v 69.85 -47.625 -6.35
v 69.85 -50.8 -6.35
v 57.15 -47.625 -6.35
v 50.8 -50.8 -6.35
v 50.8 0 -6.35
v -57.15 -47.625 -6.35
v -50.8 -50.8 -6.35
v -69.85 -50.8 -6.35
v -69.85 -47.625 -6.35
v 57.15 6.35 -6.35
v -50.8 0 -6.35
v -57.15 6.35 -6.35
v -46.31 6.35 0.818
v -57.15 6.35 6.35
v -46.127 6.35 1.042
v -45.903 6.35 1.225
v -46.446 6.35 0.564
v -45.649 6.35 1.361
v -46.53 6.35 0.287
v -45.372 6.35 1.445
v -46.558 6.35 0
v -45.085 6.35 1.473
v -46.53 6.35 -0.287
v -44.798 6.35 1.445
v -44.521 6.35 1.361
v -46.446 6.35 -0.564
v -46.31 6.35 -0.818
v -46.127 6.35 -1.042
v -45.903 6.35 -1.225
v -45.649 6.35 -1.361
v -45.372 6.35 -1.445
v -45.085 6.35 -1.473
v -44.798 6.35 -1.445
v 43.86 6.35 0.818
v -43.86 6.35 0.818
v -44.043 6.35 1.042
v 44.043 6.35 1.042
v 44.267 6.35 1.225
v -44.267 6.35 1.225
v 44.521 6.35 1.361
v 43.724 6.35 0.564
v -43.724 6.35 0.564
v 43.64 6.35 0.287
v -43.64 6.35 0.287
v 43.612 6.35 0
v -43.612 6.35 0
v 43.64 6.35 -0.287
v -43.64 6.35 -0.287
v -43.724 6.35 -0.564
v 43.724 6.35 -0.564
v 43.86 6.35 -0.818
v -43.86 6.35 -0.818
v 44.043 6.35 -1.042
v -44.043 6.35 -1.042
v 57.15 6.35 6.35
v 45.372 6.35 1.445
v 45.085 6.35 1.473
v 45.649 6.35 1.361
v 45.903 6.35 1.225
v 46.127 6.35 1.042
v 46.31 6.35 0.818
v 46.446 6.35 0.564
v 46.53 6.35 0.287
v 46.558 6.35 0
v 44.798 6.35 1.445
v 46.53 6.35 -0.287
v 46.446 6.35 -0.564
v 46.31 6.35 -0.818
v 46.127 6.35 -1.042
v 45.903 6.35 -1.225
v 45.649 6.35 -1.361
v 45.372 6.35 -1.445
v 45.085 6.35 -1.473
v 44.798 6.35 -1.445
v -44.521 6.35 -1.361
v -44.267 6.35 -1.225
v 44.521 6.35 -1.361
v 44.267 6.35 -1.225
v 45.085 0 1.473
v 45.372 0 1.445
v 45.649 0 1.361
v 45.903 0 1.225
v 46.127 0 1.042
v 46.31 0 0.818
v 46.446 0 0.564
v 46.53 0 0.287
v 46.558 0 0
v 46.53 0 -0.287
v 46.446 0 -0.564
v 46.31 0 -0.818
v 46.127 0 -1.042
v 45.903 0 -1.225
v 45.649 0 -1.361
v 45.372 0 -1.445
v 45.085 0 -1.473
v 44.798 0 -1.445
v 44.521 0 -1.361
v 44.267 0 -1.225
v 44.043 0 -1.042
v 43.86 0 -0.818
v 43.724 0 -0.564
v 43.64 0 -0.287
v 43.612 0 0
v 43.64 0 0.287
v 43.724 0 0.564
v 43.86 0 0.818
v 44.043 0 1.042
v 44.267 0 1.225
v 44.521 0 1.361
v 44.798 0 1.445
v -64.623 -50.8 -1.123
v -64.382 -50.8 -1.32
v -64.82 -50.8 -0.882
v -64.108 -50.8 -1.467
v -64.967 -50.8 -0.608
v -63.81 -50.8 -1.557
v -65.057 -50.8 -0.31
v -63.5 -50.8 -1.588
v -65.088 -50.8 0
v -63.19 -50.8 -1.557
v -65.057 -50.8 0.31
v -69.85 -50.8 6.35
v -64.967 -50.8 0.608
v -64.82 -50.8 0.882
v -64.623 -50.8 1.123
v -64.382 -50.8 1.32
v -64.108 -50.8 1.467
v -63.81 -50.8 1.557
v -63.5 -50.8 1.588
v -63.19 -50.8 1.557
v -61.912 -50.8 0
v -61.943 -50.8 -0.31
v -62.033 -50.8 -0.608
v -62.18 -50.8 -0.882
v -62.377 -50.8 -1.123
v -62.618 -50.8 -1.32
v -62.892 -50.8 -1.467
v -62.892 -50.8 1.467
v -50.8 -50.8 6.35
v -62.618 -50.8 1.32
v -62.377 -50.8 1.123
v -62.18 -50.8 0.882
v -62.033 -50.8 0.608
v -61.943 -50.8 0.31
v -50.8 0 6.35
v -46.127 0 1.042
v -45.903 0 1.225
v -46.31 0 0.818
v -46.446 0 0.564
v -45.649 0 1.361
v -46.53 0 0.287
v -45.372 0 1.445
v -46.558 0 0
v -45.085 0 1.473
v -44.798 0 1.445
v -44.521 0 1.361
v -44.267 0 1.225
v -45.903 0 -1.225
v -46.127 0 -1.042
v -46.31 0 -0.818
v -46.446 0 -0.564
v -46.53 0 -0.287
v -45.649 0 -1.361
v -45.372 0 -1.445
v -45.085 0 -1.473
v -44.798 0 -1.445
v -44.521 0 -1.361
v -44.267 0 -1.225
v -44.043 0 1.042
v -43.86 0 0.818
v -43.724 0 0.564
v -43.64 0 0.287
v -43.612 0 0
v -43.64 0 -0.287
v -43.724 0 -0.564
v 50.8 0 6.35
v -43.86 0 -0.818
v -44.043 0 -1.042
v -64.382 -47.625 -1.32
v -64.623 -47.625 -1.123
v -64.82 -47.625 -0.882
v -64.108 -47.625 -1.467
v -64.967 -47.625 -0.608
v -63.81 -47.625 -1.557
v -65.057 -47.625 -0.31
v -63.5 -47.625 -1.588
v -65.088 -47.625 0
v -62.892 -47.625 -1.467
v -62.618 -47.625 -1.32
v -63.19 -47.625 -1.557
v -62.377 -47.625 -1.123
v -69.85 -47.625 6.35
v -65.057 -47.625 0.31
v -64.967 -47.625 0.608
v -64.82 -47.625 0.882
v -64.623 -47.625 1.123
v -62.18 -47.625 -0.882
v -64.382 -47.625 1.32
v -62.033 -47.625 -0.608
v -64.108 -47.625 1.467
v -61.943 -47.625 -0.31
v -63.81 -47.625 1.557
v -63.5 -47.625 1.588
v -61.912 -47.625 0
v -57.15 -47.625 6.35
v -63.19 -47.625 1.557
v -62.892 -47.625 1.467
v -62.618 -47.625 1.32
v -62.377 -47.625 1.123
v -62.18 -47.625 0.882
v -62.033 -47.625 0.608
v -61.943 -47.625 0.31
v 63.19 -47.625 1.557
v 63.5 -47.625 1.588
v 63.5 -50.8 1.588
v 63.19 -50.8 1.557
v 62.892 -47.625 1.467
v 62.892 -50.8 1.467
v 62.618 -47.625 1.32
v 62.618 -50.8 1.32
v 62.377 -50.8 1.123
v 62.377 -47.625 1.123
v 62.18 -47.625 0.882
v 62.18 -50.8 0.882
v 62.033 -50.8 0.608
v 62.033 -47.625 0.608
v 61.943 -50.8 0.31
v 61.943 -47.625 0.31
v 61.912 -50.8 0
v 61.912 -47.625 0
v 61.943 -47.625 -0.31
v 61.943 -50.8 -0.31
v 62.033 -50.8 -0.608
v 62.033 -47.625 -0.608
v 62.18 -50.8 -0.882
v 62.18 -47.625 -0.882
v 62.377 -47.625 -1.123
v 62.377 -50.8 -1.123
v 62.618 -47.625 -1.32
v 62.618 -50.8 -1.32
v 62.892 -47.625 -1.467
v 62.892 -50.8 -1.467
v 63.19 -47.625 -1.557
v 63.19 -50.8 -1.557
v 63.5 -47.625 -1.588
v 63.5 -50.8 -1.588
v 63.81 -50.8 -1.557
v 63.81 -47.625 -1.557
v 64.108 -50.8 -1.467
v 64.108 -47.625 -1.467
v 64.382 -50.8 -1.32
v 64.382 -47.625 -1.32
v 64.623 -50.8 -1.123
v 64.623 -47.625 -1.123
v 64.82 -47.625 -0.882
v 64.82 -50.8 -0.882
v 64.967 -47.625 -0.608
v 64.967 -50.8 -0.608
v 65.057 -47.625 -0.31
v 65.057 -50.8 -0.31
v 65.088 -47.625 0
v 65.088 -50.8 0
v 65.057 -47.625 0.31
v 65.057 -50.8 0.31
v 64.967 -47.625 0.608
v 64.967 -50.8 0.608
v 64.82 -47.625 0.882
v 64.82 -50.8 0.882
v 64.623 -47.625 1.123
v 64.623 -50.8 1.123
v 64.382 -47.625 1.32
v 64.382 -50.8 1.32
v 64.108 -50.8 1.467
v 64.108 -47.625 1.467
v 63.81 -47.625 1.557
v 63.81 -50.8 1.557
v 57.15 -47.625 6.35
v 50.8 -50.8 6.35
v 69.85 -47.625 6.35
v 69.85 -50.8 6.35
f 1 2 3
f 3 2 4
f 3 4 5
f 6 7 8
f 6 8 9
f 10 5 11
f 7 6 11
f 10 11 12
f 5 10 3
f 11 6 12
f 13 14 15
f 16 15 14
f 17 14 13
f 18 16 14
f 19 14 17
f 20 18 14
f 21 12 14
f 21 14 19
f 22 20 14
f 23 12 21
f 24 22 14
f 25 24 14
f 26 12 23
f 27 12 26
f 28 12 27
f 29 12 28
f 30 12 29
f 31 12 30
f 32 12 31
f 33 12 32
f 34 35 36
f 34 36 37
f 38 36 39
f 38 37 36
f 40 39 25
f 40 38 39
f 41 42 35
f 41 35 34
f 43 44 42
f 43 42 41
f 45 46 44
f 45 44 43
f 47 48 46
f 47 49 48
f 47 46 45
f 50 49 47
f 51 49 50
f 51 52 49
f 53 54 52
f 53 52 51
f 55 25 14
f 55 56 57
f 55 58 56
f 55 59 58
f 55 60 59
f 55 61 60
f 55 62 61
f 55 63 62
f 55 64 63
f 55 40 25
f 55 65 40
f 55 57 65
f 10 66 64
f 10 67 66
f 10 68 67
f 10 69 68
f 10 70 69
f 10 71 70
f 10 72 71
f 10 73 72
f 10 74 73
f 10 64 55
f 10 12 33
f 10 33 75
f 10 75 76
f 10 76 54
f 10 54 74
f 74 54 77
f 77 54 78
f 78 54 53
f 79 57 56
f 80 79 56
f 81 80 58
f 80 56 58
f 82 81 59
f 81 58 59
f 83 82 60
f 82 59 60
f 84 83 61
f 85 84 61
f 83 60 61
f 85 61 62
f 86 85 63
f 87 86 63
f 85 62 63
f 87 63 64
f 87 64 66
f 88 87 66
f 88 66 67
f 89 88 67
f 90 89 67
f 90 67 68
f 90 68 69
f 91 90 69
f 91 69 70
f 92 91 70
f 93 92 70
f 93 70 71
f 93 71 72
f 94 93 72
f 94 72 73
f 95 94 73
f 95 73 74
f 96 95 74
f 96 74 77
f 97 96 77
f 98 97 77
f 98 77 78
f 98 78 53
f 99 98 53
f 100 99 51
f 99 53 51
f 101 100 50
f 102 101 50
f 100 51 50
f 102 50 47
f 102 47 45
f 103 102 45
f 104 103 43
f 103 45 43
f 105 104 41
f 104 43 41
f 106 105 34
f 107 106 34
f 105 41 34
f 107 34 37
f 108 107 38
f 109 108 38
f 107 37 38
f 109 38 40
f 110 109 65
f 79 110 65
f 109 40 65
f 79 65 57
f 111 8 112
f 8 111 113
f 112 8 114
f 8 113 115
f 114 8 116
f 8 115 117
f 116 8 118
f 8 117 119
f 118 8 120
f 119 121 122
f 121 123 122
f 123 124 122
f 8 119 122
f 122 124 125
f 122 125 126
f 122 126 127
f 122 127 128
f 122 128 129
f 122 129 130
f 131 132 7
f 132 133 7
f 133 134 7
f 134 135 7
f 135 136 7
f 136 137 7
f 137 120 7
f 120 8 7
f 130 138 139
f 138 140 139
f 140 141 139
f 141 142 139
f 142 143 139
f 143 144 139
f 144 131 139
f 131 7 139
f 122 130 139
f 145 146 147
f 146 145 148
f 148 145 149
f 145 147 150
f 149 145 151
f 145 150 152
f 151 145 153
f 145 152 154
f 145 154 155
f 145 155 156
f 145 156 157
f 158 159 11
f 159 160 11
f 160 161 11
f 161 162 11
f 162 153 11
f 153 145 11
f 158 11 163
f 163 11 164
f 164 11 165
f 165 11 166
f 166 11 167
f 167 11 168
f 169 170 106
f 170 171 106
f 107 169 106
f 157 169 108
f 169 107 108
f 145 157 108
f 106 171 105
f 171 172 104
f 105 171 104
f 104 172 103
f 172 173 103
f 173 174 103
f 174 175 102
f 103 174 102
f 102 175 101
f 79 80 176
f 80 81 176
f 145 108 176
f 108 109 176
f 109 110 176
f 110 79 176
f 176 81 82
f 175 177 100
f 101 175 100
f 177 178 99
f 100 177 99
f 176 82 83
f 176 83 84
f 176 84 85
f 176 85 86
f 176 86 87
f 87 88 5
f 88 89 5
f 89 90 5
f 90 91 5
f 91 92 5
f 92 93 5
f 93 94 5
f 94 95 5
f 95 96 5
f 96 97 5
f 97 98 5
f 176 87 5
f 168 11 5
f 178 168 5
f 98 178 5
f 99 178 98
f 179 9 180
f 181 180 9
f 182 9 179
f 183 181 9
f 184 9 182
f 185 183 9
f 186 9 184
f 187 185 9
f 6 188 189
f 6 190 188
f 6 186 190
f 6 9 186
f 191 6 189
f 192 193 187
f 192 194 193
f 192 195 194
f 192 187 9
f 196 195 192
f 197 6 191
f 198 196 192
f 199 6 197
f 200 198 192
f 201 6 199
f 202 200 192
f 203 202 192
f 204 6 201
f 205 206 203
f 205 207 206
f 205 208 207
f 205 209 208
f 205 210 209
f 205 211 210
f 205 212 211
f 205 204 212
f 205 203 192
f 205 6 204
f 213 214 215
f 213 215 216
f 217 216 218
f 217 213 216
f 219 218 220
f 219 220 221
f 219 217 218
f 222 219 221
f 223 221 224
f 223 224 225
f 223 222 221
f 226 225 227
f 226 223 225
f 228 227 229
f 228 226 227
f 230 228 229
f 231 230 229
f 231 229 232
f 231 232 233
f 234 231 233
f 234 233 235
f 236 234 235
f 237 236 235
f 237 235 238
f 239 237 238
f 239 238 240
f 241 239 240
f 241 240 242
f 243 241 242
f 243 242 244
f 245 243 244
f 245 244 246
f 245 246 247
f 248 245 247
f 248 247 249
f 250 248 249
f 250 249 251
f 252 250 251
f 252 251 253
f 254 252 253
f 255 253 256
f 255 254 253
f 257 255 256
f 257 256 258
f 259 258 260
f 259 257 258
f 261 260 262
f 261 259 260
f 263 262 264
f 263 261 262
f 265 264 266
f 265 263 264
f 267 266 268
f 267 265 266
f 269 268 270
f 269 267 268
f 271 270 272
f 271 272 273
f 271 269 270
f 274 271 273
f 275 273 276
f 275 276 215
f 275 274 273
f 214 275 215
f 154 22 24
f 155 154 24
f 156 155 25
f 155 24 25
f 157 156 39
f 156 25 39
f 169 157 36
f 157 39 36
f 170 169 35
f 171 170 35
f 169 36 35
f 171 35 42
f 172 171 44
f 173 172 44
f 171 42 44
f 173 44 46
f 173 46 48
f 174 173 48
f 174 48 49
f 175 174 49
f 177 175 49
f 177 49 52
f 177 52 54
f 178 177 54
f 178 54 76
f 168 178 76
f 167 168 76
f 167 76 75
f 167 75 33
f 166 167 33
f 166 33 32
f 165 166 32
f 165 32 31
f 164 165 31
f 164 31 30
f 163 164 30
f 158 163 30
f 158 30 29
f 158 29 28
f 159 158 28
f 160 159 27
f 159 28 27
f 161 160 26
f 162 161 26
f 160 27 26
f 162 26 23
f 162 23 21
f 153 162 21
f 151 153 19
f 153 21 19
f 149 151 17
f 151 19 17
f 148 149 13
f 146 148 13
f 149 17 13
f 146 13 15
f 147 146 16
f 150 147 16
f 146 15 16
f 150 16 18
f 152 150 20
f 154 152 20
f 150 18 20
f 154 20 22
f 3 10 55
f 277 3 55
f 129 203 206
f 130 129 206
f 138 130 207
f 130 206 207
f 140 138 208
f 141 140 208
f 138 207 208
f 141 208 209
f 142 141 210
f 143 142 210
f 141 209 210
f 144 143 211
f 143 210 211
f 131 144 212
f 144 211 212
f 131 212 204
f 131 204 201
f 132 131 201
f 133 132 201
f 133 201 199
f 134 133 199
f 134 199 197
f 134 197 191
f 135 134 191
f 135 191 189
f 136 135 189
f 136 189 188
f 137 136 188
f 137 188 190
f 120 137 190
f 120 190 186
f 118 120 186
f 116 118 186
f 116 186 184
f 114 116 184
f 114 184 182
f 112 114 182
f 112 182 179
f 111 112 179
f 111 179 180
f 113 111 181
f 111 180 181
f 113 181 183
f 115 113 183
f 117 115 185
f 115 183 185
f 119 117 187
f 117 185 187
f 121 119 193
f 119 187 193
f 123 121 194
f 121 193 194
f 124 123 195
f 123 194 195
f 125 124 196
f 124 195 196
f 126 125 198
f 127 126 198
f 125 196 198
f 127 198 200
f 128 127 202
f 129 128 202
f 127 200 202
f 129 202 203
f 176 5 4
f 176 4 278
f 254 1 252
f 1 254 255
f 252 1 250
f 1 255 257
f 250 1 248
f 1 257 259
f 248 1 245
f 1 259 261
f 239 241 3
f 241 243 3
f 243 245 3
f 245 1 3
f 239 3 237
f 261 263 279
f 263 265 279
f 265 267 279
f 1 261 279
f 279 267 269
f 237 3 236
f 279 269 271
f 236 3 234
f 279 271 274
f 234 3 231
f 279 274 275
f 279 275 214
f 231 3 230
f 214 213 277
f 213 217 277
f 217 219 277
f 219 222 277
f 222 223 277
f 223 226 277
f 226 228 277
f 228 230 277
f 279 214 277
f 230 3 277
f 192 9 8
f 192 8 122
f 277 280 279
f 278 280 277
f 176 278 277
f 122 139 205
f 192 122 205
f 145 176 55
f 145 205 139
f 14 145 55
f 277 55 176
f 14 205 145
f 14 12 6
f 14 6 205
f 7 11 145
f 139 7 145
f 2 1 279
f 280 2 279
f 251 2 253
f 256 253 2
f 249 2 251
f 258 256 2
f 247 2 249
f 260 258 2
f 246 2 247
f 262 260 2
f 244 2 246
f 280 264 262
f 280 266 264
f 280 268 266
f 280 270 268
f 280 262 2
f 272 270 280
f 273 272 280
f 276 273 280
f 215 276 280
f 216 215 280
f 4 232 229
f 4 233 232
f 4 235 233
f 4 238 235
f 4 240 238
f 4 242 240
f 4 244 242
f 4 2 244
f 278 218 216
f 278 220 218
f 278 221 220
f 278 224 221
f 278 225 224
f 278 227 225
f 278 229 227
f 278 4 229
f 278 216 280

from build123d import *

# Parameters (mm, degrees)
SKETCH1_W           = 114.3
SKETCH1_H           = 12.7
BOSS_EXTRUDE1_DEPTH = 6.35
SKETCH2_W           = 6.35
SKETCH2_H           = 12.7
BOSS_EXTRUDE2_DEPTH = 50.8
SKETCH3_W           = 12.7
SKETCH3_H           = 3.175
BOSS_EXTRUDE3_DEPTH = 12.7
CUT_EXTRUDE1_REACH  = 90.502
SKETCH4_R           = 1.5875
CUT_EXTRUDE2_REACH  = 92.474
SKETCH5_R           = 1.4732


with BuildPart() as part:
    # Sketch1 → Boss-Extrude1 (new body)
    with BuildSketch(Plane(origin=(0, 0, 0), x_dir=(1, 0, 0), z_dir=(0, 1, 0))):
        Rectangle(SKETCH1_W, SKETCH1_H)
    extrude(amount=BOSS_EXTRUDE1_DEPTH)

    # Sketch2 → Boss-Extrude2 (add)
    with BuildSketch(Plane.XZ):
        with Locations((-53.975, 0)):
            Rectangle(SKETCH2_W, SKETCH2_H)
    boss_extrude2 = extrude(amount=BOSS_EXTRUDE2_DEPTH)

    # Sketch3 → Boss-Extrude3 (add)
    with BuildSketch(Plane.ZY.offset(57.15)):
        with Locations((0, -49.2125)):
            Rectangle(SKETCH3_W, SKETCH3_H)
    boss_extrude3 = extrude(amount=BOSS_EXTRUDE3_DEPTH)

    # Mirror1: Boss-Extrude2, Boss-Extrude3 across plane
    add(boss_extrude2.mirror(Plane(origin=(0, 0, 0), x_dir=(0, 0, 1), z_dir=(1, 0, 0))))
    add(boss_extrude3.mirror(Plane(origin=(0, 0, 0), x_dir=(0, 0, 1), z_dir=(1, 0, 0))))

    # Sketch4 → Cut-Extrude1 (cut, up to next)
    with BuildSketch(Plane(origin=(0, -47.625, 0), x_dir=(1, 0, 0), z_dir=(0, 1, 0)), mode=Mode.PRIVATE) as cut_extrude1_sk1:
        with Locations(Location((-63.5, 0, 0), (0, 0, 270))):
            Circle(SKETCH4_R)
    cut_extrude1_tool1 = extrude(cut_extrude1_sk1.sketch, amount=-CUT_EXTRUDE1_REACH, mode=Mode.PRIVATE) & part.part
    cut_extrude1 = cut_extrude1_tool1.solids().sort_by_distance((-63.5, -47.625, 0))[0]
    add(cut_extrude1, mode=Mode.SUBTRACT)

    # Mirror2: Cut-Extrude1 across plane
    add(cut_extrude1.mirror(Plane(origin=(0, 0, 0), x_dir=(0, 0, 1), z_dir=(1, 0, 0))), mode=Mode.SUBTRACT)

    # Sketch5 → Cut-Extrude2 (cut, up to next)
    with BuildSketch(Plane(origin=(0, 6.35, 0), x_dir=(1, 0, 0), z_dir=(0, 1, 0)), mode=Mode.PRIVATE) as cut_extrude2_sk1:
        with Locations(Location((-45.085, 0, 0), (0, 0, 270))):
            Circle(SKETCH5_R)
    cut_extrude2_tool1 = extrude(cut_extrude2_sk1.sketch, amount=-CUT_EXTRUDE2_REACH, mode=Mode.PRIVATE) & part.part
    # Sketch5 → Cut-Extrude2 (cut, up to next)
    with BuildSketch(Plane(origin=(0, 6.35, 0), x_dir=(1, 0, 0), z_dir=(0, 1, 0)), mode=Mode.PRIVATE) as cut_extrude2_sk2:
        with Locations(Location((45.085, 0, 0), (0, 0, 270))):
            Circle(SKETCH5_R)
    cut_extrude2_tool2 = extrude(cut_extrude2_sk2.sketch, amount=-CUT_EXTRUDE2_REACH, mode=Mode.PRIVATE) & part.part
    add(cut_extrude2_tool1.solids().sort_by_distance((-45.085, 6.35, 0))[0], mode=Mode.SUBTRACT)
    add(cut_extrude2_tool2.solids().sort_by_distance((45.085, 6.35, 0))[0], mode=Mode.SUBTRACT)


solid = part.part
